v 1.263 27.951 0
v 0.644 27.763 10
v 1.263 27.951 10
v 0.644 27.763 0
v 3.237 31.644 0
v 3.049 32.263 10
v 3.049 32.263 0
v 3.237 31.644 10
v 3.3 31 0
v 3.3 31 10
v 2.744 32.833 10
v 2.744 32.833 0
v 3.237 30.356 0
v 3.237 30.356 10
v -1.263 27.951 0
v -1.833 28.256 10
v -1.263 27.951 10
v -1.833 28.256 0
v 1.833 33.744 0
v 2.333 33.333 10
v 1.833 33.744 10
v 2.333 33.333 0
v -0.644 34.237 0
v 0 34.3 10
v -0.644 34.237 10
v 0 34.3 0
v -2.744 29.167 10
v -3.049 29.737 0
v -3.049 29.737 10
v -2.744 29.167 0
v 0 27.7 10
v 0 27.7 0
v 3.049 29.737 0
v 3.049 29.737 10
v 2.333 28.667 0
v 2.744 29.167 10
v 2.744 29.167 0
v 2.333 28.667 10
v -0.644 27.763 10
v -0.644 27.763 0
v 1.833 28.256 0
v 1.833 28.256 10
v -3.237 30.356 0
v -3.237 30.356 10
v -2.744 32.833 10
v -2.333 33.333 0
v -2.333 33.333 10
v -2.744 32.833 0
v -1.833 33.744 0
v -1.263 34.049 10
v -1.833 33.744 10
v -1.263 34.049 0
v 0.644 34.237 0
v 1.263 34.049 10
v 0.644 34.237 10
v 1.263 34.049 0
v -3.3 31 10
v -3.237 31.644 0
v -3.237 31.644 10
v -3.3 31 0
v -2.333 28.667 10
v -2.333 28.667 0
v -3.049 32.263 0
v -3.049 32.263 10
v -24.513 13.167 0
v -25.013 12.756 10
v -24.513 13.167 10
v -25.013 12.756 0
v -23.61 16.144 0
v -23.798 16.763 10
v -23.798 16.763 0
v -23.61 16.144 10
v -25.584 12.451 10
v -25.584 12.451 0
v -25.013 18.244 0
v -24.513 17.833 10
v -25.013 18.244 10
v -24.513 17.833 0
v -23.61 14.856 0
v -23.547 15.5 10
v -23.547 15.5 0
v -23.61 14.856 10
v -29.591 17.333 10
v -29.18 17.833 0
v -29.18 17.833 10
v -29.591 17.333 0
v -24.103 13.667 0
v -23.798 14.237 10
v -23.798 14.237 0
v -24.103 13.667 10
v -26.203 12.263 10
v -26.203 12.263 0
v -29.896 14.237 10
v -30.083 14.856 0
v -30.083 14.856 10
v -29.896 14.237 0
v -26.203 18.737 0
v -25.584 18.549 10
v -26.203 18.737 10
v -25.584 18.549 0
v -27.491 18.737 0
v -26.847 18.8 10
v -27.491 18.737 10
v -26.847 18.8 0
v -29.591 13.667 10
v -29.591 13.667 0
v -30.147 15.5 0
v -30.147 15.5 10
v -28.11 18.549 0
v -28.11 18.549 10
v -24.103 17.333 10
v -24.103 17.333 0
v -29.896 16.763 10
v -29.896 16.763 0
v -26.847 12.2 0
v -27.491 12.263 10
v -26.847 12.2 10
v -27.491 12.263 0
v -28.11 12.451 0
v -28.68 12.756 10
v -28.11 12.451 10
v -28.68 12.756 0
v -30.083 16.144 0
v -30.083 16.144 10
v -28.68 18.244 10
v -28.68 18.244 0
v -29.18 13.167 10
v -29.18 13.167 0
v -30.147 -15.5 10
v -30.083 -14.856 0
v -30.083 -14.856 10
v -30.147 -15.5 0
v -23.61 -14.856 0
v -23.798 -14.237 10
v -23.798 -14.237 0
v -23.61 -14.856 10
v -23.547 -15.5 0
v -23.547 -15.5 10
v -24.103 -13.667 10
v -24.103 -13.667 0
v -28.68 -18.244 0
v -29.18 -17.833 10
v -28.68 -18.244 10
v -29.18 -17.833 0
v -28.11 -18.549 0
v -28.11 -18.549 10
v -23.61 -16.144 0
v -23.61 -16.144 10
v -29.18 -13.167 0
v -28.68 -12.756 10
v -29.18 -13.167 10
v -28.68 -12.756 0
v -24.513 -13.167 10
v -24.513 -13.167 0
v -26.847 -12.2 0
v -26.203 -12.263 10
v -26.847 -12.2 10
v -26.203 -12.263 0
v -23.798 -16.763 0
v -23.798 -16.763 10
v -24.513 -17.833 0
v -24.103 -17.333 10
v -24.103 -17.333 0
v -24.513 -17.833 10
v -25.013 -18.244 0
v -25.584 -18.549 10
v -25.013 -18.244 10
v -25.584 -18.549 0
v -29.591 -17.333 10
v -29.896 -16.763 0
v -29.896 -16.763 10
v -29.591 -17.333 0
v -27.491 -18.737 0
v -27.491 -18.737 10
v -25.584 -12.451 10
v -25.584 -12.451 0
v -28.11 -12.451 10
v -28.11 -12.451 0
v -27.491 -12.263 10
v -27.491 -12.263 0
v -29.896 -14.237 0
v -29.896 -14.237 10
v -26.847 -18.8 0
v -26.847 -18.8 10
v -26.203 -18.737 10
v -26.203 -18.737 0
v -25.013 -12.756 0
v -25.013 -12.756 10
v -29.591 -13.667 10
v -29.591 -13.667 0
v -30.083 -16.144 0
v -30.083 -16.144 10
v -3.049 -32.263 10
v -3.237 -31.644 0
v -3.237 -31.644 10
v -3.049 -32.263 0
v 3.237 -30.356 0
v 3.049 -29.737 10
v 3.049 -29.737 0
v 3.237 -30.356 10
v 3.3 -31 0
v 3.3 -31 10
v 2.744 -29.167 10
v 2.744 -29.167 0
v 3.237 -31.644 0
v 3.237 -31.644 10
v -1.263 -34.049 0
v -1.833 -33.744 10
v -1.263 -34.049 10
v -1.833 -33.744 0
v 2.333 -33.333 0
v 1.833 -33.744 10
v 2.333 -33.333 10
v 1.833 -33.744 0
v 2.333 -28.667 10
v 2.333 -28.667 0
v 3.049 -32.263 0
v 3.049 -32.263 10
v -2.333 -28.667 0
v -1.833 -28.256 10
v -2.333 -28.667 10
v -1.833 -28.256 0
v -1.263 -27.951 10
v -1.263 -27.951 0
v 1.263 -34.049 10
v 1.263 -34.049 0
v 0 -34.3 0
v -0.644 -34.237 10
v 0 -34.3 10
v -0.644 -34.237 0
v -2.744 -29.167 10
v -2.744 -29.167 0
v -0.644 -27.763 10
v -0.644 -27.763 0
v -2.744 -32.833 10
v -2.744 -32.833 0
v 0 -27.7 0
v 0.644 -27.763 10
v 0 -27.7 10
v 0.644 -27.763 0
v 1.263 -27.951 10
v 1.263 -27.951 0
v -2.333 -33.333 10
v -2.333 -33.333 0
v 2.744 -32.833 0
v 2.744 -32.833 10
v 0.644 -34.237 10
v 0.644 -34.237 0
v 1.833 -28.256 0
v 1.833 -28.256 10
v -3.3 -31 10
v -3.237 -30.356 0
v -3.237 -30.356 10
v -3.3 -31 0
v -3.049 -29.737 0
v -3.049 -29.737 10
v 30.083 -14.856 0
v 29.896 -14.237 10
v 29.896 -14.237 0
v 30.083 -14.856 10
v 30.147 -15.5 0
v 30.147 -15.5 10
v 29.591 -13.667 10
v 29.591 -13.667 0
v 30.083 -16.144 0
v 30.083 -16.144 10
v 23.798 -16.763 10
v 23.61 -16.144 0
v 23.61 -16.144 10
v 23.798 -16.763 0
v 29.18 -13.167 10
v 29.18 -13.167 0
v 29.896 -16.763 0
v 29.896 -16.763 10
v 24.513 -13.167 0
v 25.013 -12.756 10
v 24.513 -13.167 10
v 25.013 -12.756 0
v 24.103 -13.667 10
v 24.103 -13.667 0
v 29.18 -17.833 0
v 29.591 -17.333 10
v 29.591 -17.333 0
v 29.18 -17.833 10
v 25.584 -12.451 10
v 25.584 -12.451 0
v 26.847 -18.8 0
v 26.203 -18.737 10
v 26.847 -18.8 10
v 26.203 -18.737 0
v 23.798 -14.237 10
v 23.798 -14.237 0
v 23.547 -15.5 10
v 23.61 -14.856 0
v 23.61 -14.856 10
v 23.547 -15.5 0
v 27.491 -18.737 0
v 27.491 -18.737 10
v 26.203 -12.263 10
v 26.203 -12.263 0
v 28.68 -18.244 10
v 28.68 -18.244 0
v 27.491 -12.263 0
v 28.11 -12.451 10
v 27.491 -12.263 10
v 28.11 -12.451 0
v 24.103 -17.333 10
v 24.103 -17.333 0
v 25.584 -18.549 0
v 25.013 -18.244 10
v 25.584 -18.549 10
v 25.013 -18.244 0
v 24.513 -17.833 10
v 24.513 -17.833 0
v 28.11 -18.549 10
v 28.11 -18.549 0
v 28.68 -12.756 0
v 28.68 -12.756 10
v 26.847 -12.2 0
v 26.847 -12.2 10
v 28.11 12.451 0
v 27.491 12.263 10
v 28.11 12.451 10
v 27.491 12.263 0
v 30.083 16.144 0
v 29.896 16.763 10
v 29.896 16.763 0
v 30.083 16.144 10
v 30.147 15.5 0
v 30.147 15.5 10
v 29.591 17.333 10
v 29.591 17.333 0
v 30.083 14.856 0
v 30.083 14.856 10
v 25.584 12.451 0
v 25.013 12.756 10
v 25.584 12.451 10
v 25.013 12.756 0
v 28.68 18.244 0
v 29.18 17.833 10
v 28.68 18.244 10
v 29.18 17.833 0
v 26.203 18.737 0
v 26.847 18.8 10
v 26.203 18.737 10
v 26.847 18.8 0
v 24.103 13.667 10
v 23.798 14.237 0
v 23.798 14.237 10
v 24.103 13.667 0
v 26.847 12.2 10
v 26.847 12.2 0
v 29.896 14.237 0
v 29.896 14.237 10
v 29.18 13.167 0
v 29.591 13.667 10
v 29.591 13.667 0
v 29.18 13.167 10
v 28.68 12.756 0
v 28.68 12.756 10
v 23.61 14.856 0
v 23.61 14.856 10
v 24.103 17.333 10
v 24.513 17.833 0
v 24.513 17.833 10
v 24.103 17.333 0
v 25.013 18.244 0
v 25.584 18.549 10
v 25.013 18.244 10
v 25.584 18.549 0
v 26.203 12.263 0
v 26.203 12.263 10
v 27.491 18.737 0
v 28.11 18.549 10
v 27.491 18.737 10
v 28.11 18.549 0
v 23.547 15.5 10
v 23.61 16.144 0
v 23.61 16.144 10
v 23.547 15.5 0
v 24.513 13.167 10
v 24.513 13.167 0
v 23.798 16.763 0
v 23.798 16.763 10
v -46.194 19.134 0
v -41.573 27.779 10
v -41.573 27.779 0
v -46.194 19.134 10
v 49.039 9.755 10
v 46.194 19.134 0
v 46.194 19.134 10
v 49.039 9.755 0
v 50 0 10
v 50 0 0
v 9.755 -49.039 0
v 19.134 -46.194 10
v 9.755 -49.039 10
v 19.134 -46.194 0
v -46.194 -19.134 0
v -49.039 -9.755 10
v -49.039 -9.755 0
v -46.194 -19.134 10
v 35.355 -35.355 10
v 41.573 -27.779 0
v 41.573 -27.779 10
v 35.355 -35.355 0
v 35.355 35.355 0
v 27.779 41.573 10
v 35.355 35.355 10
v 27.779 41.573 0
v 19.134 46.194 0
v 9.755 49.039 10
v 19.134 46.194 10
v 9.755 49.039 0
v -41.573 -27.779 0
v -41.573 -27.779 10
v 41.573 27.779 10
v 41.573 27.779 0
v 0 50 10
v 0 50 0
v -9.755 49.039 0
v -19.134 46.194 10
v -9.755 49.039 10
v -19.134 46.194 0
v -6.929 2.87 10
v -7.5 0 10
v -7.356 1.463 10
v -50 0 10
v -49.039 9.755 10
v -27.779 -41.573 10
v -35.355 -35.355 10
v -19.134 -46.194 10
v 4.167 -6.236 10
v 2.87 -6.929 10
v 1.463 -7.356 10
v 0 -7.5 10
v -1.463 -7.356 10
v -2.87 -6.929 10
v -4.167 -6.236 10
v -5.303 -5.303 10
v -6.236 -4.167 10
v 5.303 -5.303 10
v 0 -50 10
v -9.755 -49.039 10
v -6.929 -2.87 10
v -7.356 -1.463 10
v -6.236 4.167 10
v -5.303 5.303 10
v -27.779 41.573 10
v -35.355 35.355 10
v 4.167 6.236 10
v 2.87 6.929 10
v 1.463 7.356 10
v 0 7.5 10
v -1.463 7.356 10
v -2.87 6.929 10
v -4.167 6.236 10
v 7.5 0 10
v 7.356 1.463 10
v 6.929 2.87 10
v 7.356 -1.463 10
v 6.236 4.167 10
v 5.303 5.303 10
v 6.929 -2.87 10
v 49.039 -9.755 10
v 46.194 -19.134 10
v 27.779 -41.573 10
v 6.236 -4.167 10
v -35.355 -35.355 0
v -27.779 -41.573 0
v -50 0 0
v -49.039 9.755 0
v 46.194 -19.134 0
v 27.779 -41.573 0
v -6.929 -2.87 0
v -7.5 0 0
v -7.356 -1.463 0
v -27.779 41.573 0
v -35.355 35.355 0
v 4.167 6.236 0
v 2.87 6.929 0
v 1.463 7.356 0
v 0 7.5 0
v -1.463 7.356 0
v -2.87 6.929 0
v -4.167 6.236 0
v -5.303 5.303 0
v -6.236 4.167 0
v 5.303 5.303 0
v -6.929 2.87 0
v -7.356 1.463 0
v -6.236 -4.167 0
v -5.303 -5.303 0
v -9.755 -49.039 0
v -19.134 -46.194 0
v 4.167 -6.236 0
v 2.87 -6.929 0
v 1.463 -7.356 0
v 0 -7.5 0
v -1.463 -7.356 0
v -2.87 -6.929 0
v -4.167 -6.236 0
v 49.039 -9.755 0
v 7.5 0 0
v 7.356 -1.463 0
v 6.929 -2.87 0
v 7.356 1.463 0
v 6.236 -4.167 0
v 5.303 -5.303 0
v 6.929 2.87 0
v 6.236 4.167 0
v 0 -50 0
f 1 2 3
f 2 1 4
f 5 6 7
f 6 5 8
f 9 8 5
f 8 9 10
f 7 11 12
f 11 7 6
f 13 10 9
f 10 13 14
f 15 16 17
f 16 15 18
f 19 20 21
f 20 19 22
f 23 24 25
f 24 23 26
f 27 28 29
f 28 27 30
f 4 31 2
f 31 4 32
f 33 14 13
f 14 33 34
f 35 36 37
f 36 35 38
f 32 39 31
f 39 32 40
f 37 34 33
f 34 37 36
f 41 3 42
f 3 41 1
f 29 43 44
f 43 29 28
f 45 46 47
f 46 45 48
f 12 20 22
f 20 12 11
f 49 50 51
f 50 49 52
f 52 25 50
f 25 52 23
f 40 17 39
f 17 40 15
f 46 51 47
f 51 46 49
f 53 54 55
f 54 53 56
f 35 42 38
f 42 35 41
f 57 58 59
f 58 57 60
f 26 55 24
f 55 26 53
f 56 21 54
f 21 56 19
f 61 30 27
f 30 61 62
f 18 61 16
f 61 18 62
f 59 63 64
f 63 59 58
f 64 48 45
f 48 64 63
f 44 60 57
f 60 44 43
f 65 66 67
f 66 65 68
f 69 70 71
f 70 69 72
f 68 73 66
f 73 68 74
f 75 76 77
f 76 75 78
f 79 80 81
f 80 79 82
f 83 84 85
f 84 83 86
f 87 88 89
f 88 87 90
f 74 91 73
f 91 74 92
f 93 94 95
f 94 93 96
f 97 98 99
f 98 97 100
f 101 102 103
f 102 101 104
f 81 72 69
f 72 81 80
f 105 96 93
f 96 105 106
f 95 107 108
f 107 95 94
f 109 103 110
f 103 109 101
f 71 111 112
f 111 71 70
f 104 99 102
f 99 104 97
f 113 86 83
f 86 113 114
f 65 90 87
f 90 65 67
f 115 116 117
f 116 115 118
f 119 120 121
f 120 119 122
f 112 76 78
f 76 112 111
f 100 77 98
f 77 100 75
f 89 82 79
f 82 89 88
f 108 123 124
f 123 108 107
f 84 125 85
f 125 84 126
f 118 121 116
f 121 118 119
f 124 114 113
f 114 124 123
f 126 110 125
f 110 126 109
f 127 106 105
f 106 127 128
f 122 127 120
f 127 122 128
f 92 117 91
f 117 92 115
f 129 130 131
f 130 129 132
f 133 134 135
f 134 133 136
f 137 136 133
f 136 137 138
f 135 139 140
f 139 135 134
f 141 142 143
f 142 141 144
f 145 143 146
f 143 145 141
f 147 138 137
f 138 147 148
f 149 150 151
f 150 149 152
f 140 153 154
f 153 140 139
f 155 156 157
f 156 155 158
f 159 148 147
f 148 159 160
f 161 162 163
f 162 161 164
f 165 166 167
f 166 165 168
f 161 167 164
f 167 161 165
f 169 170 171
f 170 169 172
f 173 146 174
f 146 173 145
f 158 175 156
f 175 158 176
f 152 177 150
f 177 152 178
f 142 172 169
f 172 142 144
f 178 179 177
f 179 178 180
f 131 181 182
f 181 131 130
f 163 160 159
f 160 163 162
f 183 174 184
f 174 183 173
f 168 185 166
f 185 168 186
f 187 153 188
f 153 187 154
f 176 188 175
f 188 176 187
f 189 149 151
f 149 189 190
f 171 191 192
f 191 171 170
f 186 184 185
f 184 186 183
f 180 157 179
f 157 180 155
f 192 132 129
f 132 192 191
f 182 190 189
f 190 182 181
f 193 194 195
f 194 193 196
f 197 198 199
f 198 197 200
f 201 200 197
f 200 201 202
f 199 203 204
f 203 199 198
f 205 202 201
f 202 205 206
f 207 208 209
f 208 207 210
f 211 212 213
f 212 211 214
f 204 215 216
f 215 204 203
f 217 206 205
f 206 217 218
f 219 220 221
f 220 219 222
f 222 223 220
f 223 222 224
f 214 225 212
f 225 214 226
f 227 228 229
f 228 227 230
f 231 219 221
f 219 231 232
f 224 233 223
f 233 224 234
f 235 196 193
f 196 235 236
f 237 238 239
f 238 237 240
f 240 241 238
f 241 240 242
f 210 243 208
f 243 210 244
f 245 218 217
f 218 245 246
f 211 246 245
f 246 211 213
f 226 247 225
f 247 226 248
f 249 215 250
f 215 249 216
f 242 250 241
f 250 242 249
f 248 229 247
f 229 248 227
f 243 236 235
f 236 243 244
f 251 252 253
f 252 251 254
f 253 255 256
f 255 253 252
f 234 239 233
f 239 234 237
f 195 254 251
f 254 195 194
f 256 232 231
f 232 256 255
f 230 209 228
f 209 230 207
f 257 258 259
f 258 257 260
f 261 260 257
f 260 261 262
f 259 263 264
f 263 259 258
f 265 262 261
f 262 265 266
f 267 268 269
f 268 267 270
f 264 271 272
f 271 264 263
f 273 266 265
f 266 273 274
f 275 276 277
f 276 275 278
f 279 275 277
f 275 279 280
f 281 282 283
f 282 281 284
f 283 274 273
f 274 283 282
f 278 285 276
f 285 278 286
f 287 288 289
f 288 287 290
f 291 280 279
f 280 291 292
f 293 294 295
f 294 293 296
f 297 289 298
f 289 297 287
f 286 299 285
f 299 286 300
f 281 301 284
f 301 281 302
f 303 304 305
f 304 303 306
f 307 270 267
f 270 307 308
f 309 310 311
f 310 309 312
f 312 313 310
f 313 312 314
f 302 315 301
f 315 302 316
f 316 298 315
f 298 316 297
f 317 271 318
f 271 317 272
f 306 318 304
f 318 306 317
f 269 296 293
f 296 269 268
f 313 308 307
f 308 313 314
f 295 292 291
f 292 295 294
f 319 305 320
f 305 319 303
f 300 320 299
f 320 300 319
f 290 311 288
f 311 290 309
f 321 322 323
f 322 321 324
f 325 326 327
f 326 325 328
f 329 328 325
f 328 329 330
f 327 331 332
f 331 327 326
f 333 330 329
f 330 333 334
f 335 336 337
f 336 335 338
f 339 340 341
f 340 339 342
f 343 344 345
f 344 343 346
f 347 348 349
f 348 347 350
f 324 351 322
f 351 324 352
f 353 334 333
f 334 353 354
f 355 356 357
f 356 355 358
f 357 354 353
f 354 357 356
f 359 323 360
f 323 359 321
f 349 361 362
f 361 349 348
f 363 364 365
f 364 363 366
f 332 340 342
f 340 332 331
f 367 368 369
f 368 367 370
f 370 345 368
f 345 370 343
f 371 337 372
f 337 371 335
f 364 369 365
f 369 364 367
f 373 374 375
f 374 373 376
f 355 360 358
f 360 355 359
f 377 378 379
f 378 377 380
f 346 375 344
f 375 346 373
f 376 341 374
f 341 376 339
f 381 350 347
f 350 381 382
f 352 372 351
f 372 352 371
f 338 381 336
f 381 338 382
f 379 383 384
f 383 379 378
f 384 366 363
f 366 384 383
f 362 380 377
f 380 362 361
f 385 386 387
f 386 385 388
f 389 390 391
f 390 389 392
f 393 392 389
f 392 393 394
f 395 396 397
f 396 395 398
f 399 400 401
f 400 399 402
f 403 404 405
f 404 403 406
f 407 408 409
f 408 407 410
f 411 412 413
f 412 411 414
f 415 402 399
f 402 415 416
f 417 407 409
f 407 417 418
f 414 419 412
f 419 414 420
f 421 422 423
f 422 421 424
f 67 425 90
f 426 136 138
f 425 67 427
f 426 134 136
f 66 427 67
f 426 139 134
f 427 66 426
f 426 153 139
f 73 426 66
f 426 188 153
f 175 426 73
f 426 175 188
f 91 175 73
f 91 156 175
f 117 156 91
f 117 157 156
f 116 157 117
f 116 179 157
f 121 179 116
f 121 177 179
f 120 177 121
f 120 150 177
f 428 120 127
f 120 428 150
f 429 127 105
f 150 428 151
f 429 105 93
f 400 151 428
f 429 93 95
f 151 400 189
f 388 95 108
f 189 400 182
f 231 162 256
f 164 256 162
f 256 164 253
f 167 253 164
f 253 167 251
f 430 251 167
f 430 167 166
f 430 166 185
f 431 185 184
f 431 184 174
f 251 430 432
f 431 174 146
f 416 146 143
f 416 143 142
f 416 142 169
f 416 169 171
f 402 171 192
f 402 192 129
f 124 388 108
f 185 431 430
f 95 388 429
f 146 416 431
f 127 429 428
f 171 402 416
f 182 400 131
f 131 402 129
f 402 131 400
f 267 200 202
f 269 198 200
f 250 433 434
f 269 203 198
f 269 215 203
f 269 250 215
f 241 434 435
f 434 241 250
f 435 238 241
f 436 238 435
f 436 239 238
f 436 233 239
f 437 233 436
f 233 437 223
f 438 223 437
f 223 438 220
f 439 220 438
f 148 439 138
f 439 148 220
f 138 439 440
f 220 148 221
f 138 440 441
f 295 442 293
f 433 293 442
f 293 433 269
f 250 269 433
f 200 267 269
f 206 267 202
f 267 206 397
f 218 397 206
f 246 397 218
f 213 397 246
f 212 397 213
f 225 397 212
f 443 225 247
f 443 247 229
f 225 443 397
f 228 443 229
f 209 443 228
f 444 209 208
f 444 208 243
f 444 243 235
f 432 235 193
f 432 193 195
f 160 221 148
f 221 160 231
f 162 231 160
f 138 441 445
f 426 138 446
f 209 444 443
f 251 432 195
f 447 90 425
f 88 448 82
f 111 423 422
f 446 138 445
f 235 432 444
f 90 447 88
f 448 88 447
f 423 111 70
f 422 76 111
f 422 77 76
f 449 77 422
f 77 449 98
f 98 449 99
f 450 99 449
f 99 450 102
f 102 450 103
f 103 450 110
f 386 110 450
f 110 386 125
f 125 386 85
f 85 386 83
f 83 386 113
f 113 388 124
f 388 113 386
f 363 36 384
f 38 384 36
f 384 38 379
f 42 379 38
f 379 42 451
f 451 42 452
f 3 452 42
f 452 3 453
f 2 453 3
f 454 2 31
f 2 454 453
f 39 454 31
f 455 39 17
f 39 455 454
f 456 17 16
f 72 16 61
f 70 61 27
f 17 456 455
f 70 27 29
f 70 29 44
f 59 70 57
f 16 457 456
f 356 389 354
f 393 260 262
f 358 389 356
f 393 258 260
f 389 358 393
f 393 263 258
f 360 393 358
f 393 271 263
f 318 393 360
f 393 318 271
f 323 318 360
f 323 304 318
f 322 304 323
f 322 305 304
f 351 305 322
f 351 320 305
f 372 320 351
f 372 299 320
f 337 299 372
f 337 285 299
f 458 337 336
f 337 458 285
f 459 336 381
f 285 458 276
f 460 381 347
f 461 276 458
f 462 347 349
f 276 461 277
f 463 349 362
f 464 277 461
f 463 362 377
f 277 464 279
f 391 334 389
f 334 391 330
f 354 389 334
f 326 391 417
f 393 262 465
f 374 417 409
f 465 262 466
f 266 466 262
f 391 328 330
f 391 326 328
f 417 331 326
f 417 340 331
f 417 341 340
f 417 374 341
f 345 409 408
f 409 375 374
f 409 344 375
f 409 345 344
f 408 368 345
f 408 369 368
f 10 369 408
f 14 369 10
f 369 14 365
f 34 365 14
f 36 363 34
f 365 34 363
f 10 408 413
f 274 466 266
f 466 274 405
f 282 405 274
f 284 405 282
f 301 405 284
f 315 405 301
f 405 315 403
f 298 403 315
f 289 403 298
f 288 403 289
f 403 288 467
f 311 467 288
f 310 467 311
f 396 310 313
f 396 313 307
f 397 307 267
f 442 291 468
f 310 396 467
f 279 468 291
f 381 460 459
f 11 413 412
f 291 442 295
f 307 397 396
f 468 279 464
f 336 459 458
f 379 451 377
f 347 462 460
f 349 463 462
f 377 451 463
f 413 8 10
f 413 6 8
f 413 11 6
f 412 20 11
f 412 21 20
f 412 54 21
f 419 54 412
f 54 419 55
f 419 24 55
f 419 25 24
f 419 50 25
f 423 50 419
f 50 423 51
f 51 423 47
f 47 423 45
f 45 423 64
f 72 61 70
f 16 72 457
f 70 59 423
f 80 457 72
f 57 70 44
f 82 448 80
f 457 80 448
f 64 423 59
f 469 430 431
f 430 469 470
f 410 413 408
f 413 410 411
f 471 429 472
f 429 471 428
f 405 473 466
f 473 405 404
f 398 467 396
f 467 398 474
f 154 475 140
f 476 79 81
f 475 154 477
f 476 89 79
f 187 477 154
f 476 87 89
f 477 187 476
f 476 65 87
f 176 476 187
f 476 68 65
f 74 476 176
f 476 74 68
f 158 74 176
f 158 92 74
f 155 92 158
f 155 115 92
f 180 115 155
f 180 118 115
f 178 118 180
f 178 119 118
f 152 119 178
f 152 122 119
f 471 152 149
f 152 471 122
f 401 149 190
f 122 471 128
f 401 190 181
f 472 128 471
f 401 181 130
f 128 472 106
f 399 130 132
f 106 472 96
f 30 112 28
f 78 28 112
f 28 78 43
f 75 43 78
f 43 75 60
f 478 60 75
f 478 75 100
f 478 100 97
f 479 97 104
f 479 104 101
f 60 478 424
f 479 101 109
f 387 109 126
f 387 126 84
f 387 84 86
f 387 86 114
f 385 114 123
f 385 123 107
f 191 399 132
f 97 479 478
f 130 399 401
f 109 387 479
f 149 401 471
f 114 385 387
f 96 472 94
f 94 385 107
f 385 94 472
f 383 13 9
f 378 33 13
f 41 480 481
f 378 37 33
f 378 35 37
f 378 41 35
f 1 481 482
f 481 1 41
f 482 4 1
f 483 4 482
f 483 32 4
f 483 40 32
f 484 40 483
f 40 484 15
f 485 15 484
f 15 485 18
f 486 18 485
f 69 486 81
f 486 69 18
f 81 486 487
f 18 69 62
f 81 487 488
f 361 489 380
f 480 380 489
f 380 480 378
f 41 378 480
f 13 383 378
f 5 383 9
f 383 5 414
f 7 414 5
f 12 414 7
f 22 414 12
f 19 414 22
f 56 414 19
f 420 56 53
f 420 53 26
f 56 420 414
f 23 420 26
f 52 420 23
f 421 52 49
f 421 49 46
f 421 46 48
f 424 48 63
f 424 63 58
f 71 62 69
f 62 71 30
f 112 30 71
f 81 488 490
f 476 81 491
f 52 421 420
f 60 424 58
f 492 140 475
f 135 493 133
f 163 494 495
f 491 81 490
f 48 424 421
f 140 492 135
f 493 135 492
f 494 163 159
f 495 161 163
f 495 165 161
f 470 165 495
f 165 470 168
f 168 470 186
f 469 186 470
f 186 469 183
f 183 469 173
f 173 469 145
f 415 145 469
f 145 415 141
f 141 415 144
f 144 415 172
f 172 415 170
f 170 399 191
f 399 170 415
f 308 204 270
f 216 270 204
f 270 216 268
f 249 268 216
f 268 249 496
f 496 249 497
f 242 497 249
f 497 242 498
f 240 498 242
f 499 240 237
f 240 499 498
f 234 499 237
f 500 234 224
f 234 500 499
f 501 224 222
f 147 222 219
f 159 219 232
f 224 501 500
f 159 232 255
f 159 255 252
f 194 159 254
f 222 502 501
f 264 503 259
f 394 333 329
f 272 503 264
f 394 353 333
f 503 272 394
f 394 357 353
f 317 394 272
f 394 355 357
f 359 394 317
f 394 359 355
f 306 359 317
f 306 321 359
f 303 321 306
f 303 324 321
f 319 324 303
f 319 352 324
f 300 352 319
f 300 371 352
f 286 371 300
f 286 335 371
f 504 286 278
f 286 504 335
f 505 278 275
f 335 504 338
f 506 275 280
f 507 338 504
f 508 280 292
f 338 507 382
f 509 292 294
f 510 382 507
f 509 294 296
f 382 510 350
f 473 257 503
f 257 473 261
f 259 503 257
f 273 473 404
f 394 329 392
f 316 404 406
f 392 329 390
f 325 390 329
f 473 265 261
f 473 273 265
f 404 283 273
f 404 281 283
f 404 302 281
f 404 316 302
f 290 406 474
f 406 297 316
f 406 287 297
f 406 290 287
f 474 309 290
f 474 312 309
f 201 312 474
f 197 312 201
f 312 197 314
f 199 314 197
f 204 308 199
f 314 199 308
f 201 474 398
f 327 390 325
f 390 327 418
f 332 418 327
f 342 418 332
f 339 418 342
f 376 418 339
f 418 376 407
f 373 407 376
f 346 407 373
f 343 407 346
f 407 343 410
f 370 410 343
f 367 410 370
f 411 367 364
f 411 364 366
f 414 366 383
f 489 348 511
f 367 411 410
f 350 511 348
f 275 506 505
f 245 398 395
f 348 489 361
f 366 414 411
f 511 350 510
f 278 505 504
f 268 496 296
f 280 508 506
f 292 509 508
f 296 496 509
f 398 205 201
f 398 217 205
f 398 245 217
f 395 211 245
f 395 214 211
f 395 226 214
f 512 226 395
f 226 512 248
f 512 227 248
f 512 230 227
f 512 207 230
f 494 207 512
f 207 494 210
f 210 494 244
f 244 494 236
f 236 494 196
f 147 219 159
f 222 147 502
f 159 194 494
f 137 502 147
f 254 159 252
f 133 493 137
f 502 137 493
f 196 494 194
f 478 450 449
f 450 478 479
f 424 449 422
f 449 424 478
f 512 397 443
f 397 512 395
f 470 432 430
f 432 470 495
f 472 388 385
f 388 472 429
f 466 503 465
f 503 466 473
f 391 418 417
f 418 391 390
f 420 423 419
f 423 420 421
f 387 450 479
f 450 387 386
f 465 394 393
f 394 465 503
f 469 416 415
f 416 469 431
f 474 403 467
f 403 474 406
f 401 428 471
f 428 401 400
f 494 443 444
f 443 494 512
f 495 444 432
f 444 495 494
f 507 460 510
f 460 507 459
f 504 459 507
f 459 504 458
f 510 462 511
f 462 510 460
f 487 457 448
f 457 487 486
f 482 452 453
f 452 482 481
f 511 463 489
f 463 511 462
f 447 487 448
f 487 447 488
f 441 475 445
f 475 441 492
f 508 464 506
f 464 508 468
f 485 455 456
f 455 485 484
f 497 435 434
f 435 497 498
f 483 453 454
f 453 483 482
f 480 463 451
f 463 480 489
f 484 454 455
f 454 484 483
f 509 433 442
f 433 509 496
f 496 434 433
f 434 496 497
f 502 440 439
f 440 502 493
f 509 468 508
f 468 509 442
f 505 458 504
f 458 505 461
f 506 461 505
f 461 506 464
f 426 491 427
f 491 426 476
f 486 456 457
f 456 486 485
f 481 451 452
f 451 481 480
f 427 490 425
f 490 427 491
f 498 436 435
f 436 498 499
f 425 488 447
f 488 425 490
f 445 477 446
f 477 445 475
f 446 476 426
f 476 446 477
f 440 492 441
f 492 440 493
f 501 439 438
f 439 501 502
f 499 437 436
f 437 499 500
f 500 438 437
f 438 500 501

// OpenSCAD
$fn = 32;

// ----------------------------------------------------------------------
// Flange Ø100 x 10
// 6 holes on a Ø62 bolt circle, bolted joints
// ----------------------------------------------------------------------

// --- parameters (mm) ---
flange_d = 100;  // outside diameter of the flange
thickness = 10;  // flange thickness
holes = 6;       // number of bolt holes
pcd = 62;        // bolt circle diameter
start_deg = 90;  // angle of the first hole, from +X
hole_d = 6.6;    // bolt hole diameter
bore_d = 15;     // central through bore
hub_d = 23;      // hub outside diameter
hub_h = 0;       // hub height above the flange face (0 = no hub)

// --- derived feature positions (mm) ---
height = thickness + hub_h;  // = 10   overall height of the part
pcd_r = pcd / 2;             // = 31   bolt circle radius
hole_step = 360 / holes;     // = 60   angular pitch
feature_centers = [
  [pcd_r * cos(start_deg + 0 * hole_step), pcd_r * sin(start_deg + 0 * hole_step)],
  [pcd_r * cos(start_deg + 1 * hole_step), pcd_r * sin(start_deg + 1 * hole_step)],
  [pcd_r * cos(start_deg + 2 * hole_step), pcd_r * sin(start_deg + 2 * hole_step)],
  [pcd_r * cos(start_deg + 3 * hole_step), pcd_r * sin(start_deg + 3 * hole_step)],
  [pcd_r * cos(start_deg + 4 * hole_step), pcd_r * sin(start_deg + 4 * hole_step)],
  [pcd_r * cos(start_deg + 5 * hole_step), pcd_r * sin(start_deg + 5 * hole_step)]
];   // bolt hole centres on the pitch circle

// flange disc, every hole and the bore cut straight through
difference() {
  union() {
    cylinder(d = flange_d, h = thickness);
  }
  translate([0, 0, -1]) cylinder(d = bore_d, h = height + 2);  // bore, through
  for (centre = feature_centers)
    translate([centre[0], centre[1], -1]) cylinder(d = hole_d, h = thickness + 2);
}
